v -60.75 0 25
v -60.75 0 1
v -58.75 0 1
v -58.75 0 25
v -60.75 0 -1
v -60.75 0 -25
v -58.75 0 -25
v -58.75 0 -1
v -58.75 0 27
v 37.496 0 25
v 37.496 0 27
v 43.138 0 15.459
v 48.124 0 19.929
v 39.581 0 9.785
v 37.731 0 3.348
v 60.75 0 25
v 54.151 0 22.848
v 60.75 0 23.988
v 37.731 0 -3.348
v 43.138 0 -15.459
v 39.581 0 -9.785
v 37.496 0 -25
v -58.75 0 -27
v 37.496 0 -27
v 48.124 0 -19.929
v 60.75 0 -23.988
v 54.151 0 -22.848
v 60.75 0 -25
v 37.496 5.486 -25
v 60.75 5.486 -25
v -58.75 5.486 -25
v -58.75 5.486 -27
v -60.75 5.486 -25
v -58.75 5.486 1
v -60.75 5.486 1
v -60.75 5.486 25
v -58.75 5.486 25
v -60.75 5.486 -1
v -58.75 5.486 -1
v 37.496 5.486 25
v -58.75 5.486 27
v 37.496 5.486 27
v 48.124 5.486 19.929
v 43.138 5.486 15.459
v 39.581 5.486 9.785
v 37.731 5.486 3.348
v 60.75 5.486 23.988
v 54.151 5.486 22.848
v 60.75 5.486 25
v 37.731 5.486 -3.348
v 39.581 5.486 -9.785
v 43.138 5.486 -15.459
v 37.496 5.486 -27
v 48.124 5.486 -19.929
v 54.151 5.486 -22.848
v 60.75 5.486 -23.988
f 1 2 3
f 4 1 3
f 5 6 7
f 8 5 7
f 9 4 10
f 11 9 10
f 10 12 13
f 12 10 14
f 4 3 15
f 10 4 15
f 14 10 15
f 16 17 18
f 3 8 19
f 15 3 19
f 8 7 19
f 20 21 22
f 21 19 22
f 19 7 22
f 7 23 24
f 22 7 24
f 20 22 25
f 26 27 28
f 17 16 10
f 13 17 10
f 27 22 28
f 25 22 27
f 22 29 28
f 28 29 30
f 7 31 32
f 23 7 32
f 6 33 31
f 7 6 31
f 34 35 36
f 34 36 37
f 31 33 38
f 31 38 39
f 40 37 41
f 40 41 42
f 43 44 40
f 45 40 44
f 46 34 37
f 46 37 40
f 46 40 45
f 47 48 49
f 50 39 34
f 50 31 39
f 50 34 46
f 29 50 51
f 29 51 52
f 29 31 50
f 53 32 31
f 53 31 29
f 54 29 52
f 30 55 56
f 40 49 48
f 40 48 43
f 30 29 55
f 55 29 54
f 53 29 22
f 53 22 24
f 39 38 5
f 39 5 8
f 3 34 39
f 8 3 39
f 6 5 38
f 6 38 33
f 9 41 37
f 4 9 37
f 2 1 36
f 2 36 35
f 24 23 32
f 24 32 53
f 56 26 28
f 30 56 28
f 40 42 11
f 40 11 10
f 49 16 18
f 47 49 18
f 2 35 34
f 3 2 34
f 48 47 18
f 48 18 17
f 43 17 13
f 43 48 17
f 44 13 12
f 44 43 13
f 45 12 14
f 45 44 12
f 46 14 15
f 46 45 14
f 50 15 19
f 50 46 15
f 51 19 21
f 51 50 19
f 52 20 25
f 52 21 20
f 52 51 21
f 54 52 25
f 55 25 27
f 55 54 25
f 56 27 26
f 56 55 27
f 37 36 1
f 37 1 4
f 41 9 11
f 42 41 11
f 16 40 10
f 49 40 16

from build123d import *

# Parameters (mm, degrees)
SKETCH1_W           = 121.5
SKETCH1_H           = 54
BOSS_EXTRUDE1_DEPTH = 5.4864
SKETCH2_W           = 2
SKETCH2_H           = 2
SKETCH2_W_2         = 23.254
CUT_EXTRUDE1_DEPTH  = 67.705794988


with BuildPart() as part:
    # Sketch1 → Boss-Extrude1 (new body)
    with BuildSketch(Plane(origin=(0, 0, 0), x_dir=(1, 0, 0), z_dir=(0, 1, 0))):
        Rectangle(SKETCH1_W, SKETCH1_H)
    extrude(amount=BOSS_EXTRUDE1_DEPTH)

    # Sketch2 → Cut-Extrude1 (cut, through all)
    with BuildSketch(Plane(origin=(0, 5.4864, 0), x_dir=(1, 0, 0), z_dir=(0, 1, 0))):
        with Locations((-59.75, 0)):
            Rectangle(SKETCH2_W, SKETCH2_H)
        with Locations((-59.75, 26)):
            Rectangle(SKETCH2_W, SKETCH2_H)
        with Locations((-59.75, -26)):
            Rectangle(SKETCH2_W, SKETCH2_H)
        with Locations((49.123, 26)):
            Rectangle(SKETCH2_W_2, SKETCH2_H)
        with Locations((49.123, -26)):
            Rectangle(SKETCH2_W_2, SKETCH2_H)
        with BuildLine():
            Line((60.75, 23.988403115), (60.75, -23.988403115))
            ThreePointArc((60.75, -23.988403115), (37.496, 0), (60.75, 23.988403115))
        make_face()
    extrude(amount=-CUT_EXTRUDE1_DEPTH, mode=Mode.SUBTRACT)


solid = part.part
